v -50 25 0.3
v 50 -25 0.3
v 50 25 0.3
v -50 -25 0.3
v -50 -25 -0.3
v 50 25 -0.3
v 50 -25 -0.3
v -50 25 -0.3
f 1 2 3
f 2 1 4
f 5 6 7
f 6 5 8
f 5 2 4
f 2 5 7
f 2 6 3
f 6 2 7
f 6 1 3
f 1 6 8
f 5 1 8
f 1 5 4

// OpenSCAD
// Parameters (thin sheet with sharp corners)
sheet_length = 100;
sheet_width  = 50;
sheet_thickness = 0.6;   // thinner to read as a sheet
corner_radius = 0;       // sharp corners

// Main sheet (ONE connected solid)
cube([sheet_length, sheet_width, sheet_thickness], center=true);
